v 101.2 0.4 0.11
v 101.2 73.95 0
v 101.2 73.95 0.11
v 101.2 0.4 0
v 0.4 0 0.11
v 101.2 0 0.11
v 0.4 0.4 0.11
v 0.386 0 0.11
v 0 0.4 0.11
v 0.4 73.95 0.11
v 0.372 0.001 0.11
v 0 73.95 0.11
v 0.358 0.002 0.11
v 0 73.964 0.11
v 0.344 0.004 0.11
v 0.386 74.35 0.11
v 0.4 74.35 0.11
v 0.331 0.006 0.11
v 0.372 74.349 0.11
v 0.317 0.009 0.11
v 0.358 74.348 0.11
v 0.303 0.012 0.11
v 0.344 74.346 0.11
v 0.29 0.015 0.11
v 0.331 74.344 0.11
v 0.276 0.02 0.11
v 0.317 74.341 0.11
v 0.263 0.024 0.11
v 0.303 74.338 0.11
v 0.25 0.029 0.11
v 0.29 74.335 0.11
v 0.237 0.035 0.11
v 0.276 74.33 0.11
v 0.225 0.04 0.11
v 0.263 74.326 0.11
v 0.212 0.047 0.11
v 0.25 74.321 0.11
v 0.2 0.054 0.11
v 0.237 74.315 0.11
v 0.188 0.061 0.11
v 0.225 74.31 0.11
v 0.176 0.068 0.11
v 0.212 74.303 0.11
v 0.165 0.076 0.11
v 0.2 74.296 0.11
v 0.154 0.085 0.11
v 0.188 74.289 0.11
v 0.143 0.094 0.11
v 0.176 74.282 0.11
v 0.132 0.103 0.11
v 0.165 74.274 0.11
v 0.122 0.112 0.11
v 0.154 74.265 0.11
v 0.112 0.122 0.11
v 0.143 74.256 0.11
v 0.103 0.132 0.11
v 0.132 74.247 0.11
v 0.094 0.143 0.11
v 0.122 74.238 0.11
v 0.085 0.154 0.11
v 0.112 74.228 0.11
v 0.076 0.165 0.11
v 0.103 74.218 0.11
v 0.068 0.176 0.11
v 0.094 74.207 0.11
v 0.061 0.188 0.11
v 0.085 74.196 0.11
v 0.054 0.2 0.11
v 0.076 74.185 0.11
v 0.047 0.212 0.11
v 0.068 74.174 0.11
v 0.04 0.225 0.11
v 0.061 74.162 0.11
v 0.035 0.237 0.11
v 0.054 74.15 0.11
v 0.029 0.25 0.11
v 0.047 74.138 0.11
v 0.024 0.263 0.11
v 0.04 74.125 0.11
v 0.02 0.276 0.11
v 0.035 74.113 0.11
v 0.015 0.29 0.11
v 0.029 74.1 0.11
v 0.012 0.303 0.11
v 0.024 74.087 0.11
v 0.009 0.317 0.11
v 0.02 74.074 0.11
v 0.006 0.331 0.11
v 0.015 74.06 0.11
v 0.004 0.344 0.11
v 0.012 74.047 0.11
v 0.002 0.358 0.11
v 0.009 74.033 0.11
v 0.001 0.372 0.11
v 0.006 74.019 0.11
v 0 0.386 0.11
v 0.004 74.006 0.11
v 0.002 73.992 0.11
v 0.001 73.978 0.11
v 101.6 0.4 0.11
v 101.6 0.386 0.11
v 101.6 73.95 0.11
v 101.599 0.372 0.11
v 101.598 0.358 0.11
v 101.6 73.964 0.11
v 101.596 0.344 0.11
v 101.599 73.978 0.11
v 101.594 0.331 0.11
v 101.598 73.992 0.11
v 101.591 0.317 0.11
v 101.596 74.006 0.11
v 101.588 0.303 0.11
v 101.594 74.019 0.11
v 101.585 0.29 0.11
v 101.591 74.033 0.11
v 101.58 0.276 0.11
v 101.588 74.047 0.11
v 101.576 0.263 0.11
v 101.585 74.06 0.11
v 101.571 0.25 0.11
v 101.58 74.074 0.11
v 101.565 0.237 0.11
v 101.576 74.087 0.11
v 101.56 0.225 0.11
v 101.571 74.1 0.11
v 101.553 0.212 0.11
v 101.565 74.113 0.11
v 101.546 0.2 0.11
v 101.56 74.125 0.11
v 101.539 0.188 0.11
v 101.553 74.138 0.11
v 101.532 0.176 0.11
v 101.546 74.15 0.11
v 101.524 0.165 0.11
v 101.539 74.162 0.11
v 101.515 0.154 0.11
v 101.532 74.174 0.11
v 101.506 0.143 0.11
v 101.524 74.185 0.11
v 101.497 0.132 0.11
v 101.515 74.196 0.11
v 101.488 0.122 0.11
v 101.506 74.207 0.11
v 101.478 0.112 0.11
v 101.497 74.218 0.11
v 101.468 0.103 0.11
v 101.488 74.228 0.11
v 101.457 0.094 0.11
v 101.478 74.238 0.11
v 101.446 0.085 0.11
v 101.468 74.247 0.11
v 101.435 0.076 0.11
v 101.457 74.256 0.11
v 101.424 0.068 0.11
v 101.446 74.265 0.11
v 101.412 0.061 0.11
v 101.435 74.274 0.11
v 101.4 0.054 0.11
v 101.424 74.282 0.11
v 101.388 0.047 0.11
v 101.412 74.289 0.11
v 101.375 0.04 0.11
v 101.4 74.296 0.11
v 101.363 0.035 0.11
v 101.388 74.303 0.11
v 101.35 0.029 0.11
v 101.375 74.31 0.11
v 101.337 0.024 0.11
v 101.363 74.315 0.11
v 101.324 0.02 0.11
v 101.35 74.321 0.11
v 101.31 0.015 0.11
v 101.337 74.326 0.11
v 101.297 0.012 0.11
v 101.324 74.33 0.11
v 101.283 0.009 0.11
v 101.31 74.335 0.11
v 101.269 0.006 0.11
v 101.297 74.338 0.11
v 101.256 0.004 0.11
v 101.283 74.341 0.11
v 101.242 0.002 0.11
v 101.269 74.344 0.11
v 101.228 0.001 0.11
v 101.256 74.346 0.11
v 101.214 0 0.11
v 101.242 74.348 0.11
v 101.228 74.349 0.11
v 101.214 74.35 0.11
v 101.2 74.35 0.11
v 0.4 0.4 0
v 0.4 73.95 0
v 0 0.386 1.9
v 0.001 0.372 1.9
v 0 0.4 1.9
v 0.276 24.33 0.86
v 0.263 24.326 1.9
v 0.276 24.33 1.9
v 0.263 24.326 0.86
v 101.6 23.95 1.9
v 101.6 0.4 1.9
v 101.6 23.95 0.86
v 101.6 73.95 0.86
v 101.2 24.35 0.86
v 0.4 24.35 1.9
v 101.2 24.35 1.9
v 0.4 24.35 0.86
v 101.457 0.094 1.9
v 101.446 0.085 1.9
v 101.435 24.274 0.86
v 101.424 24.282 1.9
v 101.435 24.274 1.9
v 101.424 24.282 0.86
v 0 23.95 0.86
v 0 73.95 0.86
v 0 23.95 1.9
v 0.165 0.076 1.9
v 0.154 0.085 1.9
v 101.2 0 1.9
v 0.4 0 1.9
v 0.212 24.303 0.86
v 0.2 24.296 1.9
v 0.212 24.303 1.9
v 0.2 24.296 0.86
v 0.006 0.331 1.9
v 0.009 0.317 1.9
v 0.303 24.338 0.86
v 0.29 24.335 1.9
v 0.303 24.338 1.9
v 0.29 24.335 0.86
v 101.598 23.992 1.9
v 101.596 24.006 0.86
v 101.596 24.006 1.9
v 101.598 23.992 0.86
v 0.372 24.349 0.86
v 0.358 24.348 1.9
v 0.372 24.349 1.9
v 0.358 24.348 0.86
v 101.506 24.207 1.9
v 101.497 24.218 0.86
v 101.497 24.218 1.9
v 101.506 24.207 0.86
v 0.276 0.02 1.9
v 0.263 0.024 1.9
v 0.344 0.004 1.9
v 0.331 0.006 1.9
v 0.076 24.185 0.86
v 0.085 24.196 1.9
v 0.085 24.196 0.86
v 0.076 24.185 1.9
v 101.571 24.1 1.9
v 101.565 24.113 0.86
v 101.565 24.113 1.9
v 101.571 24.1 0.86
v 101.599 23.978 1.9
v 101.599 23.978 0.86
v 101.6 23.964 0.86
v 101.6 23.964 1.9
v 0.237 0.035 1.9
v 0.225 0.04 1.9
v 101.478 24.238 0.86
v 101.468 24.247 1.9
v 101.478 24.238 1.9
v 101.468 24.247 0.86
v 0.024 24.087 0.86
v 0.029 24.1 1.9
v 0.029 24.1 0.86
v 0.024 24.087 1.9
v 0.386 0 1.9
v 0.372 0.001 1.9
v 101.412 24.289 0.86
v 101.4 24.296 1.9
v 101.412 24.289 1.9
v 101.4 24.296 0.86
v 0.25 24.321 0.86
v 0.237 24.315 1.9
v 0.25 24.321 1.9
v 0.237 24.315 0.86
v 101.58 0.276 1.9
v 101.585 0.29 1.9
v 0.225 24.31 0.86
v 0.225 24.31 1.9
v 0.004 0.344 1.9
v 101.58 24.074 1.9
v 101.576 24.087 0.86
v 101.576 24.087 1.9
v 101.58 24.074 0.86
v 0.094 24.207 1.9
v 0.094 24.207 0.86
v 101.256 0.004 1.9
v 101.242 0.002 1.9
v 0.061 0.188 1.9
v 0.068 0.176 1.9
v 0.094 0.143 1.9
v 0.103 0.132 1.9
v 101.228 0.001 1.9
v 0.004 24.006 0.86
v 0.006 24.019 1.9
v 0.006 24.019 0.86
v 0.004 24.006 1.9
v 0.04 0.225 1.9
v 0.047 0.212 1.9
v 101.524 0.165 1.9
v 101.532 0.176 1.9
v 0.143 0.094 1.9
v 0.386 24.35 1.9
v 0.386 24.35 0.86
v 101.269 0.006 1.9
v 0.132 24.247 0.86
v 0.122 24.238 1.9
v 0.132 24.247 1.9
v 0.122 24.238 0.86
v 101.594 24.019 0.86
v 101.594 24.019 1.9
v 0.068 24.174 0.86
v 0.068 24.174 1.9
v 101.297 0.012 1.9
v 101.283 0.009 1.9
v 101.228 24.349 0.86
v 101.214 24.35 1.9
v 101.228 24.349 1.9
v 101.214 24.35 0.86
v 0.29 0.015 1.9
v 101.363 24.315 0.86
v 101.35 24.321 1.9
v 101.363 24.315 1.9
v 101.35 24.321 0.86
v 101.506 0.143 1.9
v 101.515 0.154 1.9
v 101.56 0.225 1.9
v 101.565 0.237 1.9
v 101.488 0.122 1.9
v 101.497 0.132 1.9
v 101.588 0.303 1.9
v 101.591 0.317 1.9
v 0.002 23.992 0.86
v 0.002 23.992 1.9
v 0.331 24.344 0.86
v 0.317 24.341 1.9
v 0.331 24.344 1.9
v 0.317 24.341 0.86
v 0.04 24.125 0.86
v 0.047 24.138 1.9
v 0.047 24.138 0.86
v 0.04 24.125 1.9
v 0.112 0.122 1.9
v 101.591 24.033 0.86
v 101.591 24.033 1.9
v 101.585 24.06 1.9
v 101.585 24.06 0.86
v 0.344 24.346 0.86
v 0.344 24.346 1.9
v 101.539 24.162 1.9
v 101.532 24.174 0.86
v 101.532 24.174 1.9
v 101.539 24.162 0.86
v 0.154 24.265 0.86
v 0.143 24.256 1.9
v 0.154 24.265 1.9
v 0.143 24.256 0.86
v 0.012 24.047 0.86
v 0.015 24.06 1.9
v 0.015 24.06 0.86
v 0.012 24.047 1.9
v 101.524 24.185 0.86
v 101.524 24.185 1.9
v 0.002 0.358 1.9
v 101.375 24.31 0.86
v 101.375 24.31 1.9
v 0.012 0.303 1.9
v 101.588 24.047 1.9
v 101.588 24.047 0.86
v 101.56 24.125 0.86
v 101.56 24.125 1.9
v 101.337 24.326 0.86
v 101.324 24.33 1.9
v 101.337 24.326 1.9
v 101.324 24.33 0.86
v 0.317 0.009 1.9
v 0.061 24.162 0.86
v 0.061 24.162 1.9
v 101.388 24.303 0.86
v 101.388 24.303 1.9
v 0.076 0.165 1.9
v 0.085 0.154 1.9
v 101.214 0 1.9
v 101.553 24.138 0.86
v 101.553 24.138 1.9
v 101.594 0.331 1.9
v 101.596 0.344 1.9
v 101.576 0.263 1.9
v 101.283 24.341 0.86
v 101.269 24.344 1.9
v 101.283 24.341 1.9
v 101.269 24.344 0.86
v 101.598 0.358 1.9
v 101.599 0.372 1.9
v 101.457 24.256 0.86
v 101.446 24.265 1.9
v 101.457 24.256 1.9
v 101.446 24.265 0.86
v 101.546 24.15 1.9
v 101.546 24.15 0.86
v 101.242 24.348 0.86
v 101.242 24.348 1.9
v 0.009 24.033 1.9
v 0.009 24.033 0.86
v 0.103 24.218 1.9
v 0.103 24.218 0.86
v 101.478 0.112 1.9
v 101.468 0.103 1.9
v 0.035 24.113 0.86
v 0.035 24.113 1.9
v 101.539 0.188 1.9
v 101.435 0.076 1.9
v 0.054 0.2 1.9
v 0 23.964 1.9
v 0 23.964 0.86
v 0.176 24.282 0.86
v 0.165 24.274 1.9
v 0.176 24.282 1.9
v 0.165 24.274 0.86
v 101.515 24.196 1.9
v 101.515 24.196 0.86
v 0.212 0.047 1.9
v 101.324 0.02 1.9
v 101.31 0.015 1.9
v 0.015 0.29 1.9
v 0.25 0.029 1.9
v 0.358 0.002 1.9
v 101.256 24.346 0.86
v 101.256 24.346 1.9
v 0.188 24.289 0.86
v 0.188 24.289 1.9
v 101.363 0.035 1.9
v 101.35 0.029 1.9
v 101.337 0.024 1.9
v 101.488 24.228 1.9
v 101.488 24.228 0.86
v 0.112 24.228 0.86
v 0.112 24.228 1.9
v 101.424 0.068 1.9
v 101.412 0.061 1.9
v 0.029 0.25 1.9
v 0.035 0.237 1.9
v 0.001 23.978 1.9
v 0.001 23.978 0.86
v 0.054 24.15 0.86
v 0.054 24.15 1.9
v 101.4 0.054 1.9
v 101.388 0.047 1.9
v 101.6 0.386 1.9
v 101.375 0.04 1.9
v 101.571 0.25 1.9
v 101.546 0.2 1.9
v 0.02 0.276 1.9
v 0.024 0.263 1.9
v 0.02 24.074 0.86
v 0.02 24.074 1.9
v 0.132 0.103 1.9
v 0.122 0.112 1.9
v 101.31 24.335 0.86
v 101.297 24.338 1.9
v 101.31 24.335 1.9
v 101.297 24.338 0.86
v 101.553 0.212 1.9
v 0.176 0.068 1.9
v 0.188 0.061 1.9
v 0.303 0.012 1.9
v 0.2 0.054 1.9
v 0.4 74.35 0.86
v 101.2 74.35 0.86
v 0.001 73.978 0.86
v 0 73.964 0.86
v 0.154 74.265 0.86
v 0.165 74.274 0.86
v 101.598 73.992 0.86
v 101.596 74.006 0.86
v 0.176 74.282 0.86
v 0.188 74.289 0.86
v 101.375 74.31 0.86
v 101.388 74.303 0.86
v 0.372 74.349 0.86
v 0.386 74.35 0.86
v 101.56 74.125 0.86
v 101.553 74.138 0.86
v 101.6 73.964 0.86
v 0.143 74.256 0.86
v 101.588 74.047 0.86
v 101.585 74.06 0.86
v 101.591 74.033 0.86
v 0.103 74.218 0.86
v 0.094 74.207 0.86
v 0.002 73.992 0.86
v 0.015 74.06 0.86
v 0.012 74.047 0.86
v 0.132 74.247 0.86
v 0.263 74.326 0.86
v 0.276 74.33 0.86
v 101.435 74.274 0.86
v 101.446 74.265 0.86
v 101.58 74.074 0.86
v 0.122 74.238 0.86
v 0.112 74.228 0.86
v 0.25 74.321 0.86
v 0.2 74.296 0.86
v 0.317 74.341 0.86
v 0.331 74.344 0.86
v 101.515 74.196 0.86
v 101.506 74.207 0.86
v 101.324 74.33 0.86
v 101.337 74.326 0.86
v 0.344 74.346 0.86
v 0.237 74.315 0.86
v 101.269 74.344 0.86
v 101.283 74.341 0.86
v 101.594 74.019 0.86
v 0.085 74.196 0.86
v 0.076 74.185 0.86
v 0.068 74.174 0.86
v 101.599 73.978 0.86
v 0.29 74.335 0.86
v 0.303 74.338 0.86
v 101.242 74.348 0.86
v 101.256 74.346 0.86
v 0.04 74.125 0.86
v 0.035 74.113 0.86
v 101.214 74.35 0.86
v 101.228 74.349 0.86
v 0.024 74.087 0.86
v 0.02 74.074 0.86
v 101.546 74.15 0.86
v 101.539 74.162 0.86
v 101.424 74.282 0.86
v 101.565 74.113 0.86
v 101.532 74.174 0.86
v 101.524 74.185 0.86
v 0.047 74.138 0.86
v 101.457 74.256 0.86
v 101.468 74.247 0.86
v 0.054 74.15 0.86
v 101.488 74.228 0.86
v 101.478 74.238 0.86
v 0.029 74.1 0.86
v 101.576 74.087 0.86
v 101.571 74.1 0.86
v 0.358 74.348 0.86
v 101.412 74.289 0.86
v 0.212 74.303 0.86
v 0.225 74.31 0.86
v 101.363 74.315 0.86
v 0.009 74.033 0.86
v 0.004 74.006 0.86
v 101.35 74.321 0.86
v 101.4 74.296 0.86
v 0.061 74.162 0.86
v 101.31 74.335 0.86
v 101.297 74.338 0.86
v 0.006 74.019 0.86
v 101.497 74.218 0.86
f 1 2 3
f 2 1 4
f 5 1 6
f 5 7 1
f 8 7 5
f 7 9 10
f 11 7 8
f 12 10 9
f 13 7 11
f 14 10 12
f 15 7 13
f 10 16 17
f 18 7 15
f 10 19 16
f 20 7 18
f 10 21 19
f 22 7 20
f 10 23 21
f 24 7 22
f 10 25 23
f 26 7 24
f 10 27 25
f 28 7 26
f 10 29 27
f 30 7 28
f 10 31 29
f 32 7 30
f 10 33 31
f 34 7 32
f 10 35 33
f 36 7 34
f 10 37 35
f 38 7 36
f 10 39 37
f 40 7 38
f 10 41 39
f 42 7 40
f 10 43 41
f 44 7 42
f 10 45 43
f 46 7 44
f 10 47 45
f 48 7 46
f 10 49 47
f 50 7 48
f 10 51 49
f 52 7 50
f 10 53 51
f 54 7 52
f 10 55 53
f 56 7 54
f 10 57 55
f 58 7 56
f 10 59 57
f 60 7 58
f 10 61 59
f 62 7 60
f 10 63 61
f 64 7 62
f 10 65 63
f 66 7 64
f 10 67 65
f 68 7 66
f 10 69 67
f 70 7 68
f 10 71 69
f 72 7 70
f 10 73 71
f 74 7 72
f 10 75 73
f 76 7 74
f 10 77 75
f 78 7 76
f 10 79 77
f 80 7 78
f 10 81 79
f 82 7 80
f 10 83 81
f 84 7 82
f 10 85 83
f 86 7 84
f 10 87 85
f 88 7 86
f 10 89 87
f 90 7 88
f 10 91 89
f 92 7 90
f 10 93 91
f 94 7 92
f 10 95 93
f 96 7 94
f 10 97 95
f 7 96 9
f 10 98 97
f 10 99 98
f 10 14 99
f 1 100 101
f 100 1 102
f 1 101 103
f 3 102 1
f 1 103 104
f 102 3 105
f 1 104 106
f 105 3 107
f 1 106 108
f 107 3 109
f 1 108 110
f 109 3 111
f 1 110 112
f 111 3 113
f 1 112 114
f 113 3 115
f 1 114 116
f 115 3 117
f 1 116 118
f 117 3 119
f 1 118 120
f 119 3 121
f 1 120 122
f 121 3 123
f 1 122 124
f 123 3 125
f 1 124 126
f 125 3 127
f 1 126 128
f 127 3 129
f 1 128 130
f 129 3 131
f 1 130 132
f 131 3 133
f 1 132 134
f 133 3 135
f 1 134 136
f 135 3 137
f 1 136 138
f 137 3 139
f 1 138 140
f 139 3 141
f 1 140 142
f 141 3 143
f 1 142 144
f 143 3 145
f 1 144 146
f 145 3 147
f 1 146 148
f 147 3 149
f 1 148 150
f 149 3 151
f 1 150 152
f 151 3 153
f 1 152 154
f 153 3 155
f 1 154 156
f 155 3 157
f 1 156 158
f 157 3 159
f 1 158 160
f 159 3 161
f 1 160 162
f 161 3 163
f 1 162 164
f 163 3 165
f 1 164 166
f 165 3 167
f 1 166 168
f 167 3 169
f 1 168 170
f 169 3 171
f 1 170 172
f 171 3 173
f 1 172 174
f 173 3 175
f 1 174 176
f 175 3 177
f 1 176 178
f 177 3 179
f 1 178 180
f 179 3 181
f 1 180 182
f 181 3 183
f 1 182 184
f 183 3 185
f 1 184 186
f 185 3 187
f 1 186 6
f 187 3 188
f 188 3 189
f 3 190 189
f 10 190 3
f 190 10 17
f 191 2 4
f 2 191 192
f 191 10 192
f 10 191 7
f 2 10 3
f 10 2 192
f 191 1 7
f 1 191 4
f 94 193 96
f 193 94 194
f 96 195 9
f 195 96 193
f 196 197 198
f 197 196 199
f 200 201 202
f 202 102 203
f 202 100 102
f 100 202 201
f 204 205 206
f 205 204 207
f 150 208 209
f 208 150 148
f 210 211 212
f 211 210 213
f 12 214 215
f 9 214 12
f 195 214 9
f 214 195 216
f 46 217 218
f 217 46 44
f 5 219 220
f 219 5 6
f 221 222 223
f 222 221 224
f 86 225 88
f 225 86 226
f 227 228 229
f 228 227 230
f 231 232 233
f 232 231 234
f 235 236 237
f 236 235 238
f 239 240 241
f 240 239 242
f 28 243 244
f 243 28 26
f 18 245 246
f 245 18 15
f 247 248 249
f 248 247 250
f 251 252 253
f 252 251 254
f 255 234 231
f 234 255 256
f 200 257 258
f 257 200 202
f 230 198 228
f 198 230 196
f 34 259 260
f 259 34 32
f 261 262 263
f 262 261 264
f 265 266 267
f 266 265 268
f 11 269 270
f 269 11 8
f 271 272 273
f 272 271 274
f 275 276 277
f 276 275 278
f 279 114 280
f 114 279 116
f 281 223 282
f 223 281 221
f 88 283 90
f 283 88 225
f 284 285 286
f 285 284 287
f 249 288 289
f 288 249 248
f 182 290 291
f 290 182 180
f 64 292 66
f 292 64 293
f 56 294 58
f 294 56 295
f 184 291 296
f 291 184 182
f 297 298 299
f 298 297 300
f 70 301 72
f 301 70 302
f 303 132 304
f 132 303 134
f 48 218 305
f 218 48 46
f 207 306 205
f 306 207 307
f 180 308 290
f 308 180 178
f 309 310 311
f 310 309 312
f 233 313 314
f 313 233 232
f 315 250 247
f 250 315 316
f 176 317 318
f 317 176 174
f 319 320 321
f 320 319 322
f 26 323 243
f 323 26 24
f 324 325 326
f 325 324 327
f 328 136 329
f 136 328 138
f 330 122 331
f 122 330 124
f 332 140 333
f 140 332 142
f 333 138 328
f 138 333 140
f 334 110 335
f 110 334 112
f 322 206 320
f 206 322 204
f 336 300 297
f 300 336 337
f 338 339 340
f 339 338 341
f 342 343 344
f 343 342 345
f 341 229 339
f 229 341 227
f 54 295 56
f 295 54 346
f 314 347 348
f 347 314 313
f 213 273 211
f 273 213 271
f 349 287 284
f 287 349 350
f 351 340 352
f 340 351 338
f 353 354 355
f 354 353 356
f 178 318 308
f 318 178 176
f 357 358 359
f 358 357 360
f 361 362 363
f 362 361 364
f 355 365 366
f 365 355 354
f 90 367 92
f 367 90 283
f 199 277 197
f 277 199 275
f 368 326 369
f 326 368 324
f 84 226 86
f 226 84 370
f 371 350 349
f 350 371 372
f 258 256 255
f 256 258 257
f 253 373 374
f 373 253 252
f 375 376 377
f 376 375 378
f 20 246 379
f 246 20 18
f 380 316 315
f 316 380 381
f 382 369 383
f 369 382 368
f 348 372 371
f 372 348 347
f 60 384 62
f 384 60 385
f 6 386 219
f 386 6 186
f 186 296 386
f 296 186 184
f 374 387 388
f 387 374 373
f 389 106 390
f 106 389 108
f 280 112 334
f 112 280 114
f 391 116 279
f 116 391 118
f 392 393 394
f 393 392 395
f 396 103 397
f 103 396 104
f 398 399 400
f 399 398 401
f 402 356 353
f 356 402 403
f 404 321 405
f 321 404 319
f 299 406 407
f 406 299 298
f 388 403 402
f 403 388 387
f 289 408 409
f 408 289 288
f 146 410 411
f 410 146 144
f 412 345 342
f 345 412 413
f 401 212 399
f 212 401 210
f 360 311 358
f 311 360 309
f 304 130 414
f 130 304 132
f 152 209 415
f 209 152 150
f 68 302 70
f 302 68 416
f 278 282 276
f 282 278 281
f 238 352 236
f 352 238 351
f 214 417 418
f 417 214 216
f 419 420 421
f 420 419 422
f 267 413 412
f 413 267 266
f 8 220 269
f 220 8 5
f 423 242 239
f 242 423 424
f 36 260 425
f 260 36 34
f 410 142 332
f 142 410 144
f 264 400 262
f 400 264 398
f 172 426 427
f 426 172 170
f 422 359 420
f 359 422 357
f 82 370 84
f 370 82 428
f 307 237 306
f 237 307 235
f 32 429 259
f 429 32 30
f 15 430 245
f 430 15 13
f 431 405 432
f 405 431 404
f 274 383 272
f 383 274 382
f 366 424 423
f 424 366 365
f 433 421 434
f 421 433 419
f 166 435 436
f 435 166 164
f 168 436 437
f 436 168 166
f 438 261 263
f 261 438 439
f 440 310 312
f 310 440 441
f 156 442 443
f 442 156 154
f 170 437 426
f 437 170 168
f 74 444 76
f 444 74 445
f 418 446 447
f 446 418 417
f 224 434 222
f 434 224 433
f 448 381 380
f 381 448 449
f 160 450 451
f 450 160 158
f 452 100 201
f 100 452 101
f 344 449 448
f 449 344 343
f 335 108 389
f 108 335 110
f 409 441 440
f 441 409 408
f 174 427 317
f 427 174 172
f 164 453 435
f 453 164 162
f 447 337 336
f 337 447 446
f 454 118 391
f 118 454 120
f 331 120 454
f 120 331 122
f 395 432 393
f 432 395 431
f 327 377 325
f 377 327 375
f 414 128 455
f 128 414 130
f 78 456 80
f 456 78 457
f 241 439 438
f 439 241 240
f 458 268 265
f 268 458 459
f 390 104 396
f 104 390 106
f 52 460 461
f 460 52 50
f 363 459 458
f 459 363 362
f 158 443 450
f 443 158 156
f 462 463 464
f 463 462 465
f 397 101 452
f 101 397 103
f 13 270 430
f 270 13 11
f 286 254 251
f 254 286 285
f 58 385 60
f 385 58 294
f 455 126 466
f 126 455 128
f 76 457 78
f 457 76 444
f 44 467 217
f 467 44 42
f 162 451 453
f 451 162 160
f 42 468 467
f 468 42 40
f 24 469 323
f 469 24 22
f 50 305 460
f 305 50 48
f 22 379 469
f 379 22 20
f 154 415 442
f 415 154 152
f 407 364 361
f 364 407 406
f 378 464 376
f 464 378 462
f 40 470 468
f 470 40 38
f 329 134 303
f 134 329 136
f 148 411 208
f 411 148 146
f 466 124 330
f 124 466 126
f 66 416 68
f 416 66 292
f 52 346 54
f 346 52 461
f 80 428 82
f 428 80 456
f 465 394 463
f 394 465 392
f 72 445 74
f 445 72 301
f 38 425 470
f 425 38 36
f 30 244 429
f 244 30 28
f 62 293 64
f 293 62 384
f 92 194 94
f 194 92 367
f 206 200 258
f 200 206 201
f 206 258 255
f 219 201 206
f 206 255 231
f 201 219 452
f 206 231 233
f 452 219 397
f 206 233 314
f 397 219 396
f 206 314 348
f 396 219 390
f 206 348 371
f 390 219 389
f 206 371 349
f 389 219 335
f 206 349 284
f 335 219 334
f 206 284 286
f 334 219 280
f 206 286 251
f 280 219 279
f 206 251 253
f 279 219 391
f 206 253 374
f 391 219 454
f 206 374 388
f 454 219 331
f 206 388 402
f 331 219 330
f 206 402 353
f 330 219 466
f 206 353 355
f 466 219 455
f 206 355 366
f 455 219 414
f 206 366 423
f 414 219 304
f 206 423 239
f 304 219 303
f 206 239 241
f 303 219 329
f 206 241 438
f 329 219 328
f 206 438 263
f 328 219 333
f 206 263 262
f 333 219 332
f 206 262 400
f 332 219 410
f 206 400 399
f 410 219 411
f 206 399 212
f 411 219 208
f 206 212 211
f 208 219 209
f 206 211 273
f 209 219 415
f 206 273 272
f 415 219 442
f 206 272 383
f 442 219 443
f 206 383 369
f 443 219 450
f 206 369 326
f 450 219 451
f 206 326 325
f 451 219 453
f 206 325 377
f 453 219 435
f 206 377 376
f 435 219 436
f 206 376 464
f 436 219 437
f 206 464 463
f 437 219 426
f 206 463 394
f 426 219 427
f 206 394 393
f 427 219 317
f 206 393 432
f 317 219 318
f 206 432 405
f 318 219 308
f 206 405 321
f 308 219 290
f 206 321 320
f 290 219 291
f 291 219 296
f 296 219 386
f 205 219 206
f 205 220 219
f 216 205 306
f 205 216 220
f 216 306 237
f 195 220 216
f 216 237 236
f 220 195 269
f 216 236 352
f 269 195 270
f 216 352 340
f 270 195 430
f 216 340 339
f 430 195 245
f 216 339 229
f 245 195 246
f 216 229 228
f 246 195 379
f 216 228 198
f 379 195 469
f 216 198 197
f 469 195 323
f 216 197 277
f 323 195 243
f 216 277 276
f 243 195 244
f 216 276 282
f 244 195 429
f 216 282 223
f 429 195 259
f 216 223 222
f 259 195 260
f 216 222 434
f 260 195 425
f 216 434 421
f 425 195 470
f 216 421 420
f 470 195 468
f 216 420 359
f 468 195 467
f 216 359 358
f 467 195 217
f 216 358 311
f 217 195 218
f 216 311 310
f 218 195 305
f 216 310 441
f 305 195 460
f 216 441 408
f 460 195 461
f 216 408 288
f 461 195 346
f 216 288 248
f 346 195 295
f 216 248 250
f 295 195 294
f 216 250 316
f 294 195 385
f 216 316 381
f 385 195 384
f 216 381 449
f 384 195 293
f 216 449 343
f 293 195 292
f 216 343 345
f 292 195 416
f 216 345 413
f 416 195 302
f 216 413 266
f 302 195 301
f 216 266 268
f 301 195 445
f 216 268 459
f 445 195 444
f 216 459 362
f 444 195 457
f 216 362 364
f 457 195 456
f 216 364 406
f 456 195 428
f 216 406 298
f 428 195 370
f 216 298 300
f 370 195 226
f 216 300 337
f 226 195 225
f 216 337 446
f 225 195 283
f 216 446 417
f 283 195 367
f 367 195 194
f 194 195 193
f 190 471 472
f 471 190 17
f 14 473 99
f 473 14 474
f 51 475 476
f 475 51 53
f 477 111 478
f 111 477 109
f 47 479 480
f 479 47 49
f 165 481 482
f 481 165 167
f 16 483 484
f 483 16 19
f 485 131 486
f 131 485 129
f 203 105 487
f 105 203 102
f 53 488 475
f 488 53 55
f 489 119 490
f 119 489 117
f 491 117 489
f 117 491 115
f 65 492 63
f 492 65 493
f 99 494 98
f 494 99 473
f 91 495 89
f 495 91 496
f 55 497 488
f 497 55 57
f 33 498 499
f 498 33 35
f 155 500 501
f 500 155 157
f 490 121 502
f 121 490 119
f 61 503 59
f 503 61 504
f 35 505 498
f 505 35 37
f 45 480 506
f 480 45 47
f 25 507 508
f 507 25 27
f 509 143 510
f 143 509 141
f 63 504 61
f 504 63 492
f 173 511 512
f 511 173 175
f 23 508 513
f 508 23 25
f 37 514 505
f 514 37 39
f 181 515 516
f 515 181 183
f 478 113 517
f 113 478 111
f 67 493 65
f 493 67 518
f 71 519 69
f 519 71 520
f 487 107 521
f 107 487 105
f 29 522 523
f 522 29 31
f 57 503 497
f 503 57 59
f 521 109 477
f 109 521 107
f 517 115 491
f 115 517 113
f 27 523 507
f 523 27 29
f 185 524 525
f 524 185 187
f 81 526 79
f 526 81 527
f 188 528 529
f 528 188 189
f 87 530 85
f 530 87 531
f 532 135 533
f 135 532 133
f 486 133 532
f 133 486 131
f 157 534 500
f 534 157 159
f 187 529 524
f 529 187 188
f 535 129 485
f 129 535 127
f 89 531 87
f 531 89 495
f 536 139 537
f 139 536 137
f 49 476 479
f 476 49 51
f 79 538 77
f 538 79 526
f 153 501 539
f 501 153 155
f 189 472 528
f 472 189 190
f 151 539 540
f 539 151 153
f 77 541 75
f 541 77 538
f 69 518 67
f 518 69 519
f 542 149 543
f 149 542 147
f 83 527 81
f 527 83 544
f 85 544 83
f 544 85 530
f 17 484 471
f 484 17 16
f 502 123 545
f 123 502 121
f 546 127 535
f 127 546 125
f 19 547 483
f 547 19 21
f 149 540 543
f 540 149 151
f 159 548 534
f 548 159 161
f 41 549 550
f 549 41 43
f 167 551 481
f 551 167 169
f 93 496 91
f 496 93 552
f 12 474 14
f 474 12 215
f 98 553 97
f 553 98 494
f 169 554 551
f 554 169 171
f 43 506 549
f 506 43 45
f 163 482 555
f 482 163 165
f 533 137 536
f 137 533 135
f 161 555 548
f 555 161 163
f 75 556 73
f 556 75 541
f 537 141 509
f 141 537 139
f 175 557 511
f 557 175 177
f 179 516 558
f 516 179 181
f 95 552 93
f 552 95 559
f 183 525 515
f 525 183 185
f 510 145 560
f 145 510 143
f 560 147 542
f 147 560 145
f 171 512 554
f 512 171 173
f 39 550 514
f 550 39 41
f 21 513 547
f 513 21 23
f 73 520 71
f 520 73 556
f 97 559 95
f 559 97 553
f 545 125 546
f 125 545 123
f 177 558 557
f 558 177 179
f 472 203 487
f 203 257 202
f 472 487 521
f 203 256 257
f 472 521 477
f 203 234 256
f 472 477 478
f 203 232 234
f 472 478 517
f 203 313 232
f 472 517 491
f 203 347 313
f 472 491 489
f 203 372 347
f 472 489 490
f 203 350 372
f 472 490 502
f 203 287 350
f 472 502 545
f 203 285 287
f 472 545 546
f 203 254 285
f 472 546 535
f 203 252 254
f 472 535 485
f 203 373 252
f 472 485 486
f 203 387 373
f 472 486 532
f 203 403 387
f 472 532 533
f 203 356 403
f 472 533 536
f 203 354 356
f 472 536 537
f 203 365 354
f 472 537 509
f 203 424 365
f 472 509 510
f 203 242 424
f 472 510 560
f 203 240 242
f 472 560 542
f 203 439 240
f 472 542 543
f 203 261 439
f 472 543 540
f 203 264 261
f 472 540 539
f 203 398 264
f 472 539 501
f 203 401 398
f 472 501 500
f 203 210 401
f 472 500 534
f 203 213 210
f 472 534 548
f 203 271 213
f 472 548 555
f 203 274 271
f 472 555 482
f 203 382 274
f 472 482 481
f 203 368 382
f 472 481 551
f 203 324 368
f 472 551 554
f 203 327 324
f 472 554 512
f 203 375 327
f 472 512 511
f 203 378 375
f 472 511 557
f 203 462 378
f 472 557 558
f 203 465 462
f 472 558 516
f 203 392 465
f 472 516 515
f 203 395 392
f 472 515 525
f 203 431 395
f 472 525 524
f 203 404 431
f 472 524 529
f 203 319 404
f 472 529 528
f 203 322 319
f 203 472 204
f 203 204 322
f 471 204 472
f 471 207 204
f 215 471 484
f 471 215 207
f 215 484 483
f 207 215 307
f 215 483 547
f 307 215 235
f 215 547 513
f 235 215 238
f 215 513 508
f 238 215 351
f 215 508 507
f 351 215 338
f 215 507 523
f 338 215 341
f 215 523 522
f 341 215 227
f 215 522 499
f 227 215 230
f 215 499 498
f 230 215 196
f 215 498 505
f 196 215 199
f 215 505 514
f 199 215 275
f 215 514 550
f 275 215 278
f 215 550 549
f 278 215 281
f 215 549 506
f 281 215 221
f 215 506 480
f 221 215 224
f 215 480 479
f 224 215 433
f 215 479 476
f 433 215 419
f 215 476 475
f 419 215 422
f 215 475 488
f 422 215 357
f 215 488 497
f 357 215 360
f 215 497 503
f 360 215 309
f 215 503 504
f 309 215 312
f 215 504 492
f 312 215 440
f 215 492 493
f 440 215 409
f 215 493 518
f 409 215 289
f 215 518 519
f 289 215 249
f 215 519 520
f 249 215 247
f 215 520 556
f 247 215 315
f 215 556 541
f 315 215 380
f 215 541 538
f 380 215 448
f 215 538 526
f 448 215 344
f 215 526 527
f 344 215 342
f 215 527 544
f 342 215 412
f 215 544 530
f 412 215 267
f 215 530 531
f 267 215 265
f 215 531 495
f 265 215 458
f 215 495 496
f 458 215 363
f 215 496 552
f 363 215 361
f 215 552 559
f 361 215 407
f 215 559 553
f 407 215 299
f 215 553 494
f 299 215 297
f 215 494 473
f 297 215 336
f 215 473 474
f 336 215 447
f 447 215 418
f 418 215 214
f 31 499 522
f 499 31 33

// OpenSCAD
$fn=180;
over_hang=0.40;
over_high=0.11;
rad=0.40;
x=4*25.4;
y=24.35;
thick=1.90;
lip_high=1.04;
lip_wide=50;

// recessed base layer
translate([over_hang, over_hang, 0]) cube([x-over_hang*2, y+lip_wide-over_hang*2, over_high]);

// body over cutting edge
translate([0, 0, over_high]) linear_extrude(thick-over_high) hull() {
    translate([0+rad, 0+rad, 0]) circle(rad);
    translate([x-rad, 0+rad, 0]) circle(rad);
    translate([x-rad, y-rad, 0]) circle(rad);
    translate([0+rad, y-rad, 0]) circle(rad);
}

// body over main table
translate([0, 0, over_high]) linear_extrude(thick-over_high-lip_high) hull() {
    translate([0+rad, 0+rad, 0]) circle(rad);
    translate([x-rad, 0+rad, 0]) circle(rad);
    translate([x-rad, y+lip_wide-rad, 0]) circle(rad);
    translate([0+rad, y+lip_wide-rad, 0]) circle(rad);
}




//cube([x, y, thick-over_high]);


//cube([3*25.4, 24.35, 1.50]);
